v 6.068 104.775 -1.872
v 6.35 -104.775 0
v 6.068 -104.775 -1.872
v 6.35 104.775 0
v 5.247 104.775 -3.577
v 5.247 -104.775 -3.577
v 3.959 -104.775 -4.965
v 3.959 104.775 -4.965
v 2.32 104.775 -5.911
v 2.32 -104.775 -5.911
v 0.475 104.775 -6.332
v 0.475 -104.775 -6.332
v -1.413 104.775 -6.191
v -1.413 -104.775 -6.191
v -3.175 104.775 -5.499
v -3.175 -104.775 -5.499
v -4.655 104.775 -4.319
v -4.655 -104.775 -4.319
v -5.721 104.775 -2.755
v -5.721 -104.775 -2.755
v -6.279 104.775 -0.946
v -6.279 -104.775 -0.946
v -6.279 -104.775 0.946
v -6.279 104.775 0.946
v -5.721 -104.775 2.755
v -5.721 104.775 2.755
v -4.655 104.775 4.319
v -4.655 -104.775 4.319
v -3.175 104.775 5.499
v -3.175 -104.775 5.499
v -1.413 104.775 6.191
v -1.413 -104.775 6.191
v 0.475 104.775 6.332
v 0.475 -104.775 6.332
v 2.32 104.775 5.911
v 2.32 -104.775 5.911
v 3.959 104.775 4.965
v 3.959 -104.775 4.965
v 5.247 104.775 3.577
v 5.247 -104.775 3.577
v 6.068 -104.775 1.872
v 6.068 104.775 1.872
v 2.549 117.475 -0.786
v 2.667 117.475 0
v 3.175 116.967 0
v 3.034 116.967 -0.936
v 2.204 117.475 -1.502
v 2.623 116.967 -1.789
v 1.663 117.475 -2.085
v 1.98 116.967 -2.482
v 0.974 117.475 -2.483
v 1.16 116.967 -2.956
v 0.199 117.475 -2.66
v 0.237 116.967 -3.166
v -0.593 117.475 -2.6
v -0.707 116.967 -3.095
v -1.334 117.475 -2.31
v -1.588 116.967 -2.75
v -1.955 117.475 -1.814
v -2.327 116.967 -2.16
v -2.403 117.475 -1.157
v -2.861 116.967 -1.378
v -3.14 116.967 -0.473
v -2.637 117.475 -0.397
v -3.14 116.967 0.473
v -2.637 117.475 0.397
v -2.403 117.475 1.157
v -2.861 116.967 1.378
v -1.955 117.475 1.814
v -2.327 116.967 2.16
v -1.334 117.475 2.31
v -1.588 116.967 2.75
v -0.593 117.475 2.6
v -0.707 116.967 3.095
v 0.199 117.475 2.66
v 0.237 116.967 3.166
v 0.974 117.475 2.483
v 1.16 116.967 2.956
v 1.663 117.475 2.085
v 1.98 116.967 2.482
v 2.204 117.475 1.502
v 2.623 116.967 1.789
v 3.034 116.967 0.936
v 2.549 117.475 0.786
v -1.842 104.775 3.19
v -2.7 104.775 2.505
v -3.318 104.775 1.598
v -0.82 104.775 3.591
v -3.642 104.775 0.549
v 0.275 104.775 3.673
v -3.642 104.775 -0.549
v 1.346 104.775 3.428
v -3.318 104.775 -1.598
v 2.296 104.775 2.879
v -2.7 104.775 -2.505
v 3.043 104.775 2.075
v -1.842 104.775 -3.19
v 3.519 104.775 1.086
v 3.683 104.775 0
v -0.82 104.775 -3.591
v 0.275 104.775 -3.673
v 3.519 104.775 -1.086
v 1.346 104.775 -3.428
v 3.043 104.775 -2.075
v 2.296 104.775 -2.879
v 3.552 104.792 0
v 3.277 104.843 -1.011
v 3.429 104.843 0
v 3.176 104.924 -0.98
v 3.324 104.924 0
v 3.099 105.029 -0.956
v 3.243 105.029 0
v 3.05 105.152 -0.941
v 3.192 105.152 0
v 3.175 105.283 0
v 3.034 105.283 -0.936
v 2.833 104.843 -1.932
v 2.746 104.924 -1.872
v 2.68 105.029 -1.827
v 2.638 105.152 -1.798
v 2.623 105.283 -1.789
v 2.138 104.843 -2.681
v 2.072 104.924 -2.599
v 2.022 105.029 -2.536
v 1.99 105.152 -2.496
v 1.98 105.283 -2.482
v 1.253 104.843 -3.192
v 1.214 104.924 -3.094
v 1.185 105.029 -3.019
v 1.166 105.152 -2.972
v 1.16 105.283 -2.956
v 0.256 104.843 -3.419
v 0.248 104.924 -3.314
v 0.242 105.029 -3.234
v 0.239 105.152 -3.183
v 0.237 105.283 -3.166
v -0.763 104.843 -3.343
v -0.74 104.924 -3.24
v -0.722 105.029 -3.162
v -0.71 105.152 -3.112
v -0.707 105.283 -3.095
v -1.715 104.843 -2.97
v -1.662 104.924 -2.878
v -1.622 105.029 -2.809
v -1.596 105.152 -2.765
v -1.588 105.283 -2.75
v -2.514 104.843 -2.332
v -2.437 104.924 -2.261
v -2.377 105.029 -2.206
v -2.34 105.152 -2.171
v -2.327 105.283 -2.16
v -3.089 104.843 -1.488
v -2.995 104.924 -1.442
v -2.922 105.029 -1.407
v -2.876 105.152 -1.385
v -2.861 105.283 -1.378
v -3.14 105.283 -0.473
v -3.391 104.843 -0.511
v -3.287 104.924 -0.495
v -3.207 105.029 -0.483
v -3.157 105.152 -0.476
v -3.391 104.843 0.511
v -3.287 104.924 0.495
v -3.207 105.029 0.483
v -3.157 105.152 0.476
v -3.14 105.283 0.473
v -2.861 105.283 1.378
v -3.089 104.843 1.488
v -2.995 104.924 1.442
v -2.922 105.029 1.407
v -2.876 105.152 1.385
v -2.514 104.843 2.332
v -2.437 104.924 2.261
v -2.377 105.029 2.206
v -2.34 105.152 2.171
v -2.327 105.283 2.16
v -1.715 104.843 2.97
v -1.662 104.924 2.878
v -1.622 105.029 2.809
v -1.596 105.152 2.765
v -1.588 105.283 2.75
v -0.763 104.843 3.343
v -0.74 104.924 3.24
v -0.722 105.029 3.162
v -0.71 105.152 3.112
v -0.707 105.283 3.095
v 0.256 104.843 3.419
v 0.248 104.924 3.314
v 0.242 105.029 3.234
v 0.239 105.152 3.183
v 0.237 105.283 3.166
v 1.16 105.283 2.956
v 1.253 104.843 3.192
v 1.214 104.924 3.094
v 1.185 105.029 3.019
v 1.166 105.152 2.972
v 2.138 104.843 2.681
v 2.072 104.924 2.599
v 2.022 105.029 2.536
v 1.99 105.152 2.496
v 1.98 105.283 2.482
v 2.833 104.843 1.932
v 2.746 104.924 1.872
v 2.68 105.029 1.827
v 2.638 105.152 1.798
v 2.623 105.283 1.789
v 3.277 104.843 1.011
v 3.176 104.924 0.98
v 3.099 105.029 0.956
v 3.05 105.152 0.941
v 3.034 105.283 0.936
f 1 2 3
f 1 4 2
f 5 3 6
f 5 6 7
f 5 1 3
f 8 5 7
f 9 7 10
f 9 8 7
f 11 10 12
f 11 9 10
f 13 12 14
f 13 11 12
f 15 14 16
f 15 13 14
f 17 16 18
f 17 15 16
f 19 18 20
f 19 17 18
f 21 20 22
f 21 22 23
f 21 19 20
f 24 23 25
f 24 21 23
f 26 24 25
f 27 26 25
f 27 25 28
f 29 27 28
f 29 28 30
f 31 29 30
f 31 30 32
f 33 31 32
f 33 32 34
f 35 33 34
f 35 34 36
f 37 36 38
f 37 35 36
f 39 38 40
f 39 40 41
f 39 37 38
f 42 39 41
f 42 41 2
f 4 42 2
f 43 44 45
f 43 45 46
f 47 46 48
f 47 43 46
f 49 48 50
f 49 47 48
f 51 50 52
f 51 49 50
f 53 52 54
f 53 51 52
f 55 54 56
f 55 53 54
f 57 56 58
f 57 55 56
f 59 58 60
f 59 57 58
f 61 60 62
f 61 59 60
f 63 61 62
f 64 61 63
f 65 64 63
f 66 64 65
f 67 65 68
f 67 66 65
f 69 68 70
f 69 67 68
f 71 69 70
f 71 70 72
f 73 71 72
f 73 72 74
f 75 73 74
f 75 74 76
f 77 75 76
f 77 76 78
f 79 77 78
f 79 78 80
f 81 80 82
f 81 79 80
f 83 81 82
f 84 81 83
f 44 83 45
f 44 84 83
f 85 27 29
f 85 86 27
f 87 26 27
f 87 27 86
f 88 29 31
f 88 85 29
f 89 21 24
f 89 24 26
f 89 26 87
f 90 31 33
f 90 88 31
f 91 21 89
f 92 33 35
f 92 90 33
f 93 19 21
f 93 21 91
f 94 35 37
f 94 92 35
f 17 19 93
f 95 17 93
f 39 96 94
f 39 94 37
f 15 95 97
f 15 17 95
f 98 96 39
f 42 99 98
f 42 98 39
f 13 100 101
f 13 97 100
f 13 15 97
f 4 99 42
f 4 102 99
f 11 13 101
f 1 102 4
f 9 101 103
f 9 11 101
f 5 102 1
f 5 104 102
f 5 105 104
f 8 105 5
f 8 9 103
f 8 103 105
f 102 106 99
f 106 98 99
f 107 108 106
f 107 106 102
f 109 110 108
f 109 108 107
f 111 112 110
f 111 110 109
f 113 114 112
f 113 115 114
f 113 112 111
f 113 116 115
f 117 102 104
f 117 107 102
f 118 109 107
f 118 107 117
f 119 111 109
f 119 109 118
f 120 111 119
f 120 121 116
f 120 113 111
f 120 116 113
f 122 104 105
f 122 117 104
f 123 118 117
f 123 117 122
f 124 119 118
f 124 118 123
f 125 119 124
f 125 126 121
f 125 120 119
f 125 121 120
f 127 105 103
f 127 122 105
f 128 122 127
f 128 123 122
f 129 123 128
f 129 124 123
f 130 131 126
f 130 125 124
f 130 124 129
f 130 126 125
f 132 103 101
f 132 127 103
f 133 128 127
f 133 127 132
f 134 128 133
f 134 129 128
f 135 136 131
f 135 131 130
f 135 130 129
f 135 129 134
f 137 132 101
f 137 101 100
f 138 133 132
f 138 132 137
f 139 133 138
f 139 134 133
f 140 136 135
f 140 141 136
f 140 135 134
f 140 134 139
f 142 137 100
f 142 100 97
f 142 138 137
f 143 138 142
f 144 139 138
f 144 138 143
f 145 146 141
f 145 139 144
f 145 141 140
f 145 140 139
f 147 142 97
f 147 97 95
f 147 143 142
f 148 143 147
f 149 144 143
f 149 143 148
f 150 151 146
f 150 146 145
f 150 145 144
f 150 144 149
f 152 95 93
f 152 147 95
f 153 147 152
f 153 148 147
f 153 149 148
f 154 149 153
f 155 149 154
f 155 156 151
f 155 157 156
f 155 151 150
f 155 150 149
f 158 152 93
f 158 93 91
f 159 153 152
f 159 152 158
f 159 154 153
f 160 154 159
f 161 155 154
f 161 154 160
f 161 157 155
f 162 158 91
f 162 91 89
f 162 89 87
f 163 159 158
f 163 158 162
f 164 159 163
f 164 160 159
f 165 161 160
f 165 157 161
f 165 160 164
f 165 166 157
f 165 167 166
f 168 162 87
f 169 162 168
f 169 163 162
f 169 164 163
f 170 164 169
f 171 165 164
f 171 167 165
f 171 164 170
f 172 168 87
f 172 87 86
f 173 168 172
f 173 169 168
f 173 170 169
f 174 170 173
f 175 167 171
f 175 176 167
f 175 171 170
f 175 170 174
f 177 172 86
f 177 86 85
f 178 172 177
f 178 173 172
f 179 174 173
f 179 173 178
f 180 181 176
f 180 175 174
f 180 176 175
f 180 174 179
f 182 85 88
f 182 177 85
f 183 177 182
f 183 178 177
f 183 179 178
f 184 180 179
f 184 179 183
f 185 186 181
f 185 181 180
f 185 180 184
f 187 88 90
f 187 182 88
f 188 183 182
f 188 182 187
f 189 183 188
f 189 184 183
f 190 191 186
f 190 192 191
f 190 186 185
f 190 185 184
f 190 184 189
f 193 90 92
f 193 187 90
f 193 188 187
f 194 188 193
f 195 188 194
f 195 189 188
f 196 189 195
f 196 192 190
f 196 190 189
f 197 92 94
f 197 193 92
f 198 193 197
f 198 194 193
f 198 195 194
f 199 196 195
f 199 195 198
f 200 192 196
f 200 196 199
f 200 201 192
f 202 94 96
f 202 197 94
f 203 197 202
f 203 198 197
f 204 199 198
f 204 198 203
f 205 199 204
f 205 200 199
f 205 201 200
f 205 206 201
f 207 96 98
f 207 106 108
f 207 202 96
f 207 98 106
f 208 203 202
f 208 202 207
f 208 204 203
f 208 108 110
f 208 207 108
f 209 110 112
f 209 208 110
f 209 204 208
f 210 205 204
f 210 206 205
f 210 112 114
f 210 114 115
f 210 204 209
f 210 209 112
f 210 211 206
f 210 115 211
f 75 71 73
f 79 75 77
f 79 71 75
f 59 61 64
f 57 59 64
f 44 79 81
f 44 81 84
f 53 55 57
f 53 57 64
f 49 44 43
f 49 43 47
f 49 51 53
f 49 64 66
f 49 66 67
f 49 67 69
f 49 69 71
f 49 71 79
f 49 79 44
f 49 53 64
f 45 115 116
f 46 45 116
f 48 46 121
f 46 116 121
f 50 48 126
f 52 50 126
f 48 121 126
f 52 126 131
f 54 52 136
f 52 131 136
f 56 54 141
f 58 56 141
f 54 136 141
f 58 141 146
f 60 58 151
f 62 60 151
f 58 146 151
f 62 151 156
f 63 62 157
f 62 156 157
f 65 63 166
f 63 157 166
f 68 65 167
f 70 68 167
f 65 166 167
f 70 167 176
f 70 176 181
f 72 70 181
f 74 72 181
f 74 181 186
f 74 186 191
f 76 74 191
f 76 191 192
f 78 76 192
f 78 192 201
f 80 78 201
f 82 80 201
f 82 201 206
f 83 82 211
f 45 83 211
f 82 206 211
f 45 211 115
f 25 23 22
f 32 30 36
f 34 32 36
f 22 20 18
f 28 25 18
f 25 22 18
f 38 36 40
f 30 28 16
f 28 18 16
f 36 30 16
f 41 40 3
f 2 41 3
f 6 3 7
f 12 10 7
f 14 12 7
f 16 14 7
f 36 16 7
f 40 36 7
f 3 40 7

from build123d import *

# Parameters (mm, degrees)
SKETCH1_R           = 6.35
BOSS_EXTRUDE1_DEPTH = 104.775
SKETCH2_R           = 3.175
BOSS_EXTRUDE2_DEPTH = 12.7
FILLET1_R           = 0.508
CHAMFER1_SIZE       = 0.508


with BuildPart() as part:
    # Sketch1 → Boss-Extrude1 (new body, symmetric)
    with BuildSketch(Plane(origin=(0, 0, 0), x_dir=(1, 0, 0), z_dir=(0, 1, 0))):
        Circle(SKETCH1_R)
    extrude(amount=BOSS_EXTRUDE1_DEPTH, both=True)

    # Sketch2 → Boss-Extrude2 (add)
    with BuildSketch(Plane(origin=(0, 104.775, 0), x_dir=(1, 0, 0), z_dir=(0, 1, 0))):
        Circle(SKETCH2_R)
    extrude(amount=BOSS_EXTRUDE2_DEPTH)

    # Fillet1
    fillet1_edges = [part.edges().sort_by_distance(p)[0] for p in [
        (-3.175, 104.775, 0),
    ]]
    fillet(fillet1_edges, radius=FILLET1_R)

    # Chamfer1
    chamfer1_edges = [part.edges().sort_by_distance(p)[0] for p in [
        (-3.175, 117.475, 0),
    ]]
    chamfer(chamfer1_edges, length=CHAMFER1_SIZE)


solid = part.part
